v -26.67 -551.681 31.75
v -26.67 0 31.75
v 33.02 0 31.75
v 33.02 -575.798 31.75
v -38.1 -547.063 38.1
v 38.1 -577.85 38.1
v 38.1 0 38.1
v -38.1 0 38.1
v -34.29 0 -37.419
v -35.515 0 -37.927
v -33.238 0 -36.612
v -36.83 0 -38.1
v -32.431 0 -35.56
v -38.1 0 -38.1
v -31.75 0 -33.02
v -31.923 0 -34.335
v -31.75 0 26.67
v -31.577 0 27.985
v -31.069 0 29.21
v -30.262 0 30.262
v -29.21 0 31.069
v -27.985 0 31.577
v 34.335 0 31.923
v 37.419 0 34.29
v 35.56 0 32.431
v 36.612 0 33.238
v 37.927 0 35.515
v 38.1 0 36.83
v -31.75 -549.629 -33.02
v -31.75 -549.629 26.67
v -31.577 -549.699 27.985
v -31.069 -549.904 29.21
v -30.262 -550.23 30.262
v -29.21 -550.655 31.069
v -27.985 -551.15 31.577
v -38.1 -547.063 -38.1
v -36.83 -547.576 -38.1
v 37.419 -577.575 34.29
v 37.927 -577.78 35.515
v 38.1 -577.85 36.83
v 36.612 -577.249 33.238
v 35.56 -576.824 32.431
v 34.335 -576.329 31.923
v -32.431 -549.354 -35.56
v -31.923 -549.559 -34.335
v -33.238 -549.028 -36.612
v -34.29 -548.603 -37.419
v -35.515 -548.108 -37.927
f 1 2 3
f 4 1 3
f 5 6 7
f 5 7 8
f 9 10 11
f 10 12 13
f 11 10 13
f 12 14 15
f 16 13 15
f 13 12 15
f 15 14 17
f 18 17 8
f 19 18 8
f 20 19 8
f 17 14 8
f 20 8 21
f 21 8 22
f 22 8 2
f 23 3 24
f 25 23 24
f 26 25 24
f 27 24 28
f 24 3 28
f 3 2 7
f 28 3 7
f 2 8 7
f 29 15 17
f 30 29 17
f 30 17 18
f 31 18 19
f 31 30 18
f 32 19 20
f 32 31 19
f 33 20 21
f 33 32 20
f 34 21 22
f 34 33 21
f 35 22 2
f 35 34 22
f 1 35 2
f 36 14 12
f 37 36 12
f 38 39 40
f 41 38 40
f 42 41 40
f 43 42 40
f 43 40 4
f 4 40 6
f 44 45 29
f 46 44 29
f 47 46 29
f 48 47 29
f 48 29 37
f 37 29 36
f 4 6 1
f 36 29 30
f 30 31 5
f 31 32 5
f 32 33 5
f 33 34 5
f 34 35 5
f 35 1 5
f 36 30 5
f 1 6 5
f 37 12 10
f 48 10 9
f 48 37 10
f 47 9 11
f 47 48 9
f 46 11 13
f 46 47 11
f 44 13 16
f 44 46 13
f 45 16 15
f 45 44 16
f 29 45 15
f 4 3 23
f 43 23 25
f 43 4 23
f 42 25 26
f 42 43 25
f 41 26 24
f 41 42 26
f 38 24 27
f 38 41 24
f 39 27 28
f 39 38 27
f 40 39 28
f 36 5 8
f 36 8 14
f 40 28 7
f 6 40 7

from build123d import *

# Parameters (mm, degrees)
F1_DEPTH = 577.85
F2_R     = 5.08
F4_DEPTH = 76.2


with BuildPart() as f1:
    # F0 (on Front) → F1 (new body)
    with BuildSketch(Plane.XZ):
        Polygon((-38.1, -38.1), (-31.75, -38.1), (-31.75, 31.75), (38.1, 31.75), (38.1, 38.1), (-38.1, 38.1), align=None)
    extrude(amount=F1_DEPTH)

    # F2
    f2_edges = [f1.edges().sort_by_distance(p)[0] for p in [
        (-31.75, -288.925, 31.75),
        (38.1, -288.925, 31.75),
        (-31.75, -288.925, -38.1),
    ]]
    fillet(f2_edges, radius=F2_R)

    # F3 (on face) → F4 (cut)
    with BuildSketch(Plane.XY.offset(38.1)):
        Polygon((-38.1, -577.85), (38.1, -577.85), (-38.1, -547.063202), align=None)
    extrude(amount=-F4_DEPTH, mode=Mode.SUBTRACT)


solid = f1.part
